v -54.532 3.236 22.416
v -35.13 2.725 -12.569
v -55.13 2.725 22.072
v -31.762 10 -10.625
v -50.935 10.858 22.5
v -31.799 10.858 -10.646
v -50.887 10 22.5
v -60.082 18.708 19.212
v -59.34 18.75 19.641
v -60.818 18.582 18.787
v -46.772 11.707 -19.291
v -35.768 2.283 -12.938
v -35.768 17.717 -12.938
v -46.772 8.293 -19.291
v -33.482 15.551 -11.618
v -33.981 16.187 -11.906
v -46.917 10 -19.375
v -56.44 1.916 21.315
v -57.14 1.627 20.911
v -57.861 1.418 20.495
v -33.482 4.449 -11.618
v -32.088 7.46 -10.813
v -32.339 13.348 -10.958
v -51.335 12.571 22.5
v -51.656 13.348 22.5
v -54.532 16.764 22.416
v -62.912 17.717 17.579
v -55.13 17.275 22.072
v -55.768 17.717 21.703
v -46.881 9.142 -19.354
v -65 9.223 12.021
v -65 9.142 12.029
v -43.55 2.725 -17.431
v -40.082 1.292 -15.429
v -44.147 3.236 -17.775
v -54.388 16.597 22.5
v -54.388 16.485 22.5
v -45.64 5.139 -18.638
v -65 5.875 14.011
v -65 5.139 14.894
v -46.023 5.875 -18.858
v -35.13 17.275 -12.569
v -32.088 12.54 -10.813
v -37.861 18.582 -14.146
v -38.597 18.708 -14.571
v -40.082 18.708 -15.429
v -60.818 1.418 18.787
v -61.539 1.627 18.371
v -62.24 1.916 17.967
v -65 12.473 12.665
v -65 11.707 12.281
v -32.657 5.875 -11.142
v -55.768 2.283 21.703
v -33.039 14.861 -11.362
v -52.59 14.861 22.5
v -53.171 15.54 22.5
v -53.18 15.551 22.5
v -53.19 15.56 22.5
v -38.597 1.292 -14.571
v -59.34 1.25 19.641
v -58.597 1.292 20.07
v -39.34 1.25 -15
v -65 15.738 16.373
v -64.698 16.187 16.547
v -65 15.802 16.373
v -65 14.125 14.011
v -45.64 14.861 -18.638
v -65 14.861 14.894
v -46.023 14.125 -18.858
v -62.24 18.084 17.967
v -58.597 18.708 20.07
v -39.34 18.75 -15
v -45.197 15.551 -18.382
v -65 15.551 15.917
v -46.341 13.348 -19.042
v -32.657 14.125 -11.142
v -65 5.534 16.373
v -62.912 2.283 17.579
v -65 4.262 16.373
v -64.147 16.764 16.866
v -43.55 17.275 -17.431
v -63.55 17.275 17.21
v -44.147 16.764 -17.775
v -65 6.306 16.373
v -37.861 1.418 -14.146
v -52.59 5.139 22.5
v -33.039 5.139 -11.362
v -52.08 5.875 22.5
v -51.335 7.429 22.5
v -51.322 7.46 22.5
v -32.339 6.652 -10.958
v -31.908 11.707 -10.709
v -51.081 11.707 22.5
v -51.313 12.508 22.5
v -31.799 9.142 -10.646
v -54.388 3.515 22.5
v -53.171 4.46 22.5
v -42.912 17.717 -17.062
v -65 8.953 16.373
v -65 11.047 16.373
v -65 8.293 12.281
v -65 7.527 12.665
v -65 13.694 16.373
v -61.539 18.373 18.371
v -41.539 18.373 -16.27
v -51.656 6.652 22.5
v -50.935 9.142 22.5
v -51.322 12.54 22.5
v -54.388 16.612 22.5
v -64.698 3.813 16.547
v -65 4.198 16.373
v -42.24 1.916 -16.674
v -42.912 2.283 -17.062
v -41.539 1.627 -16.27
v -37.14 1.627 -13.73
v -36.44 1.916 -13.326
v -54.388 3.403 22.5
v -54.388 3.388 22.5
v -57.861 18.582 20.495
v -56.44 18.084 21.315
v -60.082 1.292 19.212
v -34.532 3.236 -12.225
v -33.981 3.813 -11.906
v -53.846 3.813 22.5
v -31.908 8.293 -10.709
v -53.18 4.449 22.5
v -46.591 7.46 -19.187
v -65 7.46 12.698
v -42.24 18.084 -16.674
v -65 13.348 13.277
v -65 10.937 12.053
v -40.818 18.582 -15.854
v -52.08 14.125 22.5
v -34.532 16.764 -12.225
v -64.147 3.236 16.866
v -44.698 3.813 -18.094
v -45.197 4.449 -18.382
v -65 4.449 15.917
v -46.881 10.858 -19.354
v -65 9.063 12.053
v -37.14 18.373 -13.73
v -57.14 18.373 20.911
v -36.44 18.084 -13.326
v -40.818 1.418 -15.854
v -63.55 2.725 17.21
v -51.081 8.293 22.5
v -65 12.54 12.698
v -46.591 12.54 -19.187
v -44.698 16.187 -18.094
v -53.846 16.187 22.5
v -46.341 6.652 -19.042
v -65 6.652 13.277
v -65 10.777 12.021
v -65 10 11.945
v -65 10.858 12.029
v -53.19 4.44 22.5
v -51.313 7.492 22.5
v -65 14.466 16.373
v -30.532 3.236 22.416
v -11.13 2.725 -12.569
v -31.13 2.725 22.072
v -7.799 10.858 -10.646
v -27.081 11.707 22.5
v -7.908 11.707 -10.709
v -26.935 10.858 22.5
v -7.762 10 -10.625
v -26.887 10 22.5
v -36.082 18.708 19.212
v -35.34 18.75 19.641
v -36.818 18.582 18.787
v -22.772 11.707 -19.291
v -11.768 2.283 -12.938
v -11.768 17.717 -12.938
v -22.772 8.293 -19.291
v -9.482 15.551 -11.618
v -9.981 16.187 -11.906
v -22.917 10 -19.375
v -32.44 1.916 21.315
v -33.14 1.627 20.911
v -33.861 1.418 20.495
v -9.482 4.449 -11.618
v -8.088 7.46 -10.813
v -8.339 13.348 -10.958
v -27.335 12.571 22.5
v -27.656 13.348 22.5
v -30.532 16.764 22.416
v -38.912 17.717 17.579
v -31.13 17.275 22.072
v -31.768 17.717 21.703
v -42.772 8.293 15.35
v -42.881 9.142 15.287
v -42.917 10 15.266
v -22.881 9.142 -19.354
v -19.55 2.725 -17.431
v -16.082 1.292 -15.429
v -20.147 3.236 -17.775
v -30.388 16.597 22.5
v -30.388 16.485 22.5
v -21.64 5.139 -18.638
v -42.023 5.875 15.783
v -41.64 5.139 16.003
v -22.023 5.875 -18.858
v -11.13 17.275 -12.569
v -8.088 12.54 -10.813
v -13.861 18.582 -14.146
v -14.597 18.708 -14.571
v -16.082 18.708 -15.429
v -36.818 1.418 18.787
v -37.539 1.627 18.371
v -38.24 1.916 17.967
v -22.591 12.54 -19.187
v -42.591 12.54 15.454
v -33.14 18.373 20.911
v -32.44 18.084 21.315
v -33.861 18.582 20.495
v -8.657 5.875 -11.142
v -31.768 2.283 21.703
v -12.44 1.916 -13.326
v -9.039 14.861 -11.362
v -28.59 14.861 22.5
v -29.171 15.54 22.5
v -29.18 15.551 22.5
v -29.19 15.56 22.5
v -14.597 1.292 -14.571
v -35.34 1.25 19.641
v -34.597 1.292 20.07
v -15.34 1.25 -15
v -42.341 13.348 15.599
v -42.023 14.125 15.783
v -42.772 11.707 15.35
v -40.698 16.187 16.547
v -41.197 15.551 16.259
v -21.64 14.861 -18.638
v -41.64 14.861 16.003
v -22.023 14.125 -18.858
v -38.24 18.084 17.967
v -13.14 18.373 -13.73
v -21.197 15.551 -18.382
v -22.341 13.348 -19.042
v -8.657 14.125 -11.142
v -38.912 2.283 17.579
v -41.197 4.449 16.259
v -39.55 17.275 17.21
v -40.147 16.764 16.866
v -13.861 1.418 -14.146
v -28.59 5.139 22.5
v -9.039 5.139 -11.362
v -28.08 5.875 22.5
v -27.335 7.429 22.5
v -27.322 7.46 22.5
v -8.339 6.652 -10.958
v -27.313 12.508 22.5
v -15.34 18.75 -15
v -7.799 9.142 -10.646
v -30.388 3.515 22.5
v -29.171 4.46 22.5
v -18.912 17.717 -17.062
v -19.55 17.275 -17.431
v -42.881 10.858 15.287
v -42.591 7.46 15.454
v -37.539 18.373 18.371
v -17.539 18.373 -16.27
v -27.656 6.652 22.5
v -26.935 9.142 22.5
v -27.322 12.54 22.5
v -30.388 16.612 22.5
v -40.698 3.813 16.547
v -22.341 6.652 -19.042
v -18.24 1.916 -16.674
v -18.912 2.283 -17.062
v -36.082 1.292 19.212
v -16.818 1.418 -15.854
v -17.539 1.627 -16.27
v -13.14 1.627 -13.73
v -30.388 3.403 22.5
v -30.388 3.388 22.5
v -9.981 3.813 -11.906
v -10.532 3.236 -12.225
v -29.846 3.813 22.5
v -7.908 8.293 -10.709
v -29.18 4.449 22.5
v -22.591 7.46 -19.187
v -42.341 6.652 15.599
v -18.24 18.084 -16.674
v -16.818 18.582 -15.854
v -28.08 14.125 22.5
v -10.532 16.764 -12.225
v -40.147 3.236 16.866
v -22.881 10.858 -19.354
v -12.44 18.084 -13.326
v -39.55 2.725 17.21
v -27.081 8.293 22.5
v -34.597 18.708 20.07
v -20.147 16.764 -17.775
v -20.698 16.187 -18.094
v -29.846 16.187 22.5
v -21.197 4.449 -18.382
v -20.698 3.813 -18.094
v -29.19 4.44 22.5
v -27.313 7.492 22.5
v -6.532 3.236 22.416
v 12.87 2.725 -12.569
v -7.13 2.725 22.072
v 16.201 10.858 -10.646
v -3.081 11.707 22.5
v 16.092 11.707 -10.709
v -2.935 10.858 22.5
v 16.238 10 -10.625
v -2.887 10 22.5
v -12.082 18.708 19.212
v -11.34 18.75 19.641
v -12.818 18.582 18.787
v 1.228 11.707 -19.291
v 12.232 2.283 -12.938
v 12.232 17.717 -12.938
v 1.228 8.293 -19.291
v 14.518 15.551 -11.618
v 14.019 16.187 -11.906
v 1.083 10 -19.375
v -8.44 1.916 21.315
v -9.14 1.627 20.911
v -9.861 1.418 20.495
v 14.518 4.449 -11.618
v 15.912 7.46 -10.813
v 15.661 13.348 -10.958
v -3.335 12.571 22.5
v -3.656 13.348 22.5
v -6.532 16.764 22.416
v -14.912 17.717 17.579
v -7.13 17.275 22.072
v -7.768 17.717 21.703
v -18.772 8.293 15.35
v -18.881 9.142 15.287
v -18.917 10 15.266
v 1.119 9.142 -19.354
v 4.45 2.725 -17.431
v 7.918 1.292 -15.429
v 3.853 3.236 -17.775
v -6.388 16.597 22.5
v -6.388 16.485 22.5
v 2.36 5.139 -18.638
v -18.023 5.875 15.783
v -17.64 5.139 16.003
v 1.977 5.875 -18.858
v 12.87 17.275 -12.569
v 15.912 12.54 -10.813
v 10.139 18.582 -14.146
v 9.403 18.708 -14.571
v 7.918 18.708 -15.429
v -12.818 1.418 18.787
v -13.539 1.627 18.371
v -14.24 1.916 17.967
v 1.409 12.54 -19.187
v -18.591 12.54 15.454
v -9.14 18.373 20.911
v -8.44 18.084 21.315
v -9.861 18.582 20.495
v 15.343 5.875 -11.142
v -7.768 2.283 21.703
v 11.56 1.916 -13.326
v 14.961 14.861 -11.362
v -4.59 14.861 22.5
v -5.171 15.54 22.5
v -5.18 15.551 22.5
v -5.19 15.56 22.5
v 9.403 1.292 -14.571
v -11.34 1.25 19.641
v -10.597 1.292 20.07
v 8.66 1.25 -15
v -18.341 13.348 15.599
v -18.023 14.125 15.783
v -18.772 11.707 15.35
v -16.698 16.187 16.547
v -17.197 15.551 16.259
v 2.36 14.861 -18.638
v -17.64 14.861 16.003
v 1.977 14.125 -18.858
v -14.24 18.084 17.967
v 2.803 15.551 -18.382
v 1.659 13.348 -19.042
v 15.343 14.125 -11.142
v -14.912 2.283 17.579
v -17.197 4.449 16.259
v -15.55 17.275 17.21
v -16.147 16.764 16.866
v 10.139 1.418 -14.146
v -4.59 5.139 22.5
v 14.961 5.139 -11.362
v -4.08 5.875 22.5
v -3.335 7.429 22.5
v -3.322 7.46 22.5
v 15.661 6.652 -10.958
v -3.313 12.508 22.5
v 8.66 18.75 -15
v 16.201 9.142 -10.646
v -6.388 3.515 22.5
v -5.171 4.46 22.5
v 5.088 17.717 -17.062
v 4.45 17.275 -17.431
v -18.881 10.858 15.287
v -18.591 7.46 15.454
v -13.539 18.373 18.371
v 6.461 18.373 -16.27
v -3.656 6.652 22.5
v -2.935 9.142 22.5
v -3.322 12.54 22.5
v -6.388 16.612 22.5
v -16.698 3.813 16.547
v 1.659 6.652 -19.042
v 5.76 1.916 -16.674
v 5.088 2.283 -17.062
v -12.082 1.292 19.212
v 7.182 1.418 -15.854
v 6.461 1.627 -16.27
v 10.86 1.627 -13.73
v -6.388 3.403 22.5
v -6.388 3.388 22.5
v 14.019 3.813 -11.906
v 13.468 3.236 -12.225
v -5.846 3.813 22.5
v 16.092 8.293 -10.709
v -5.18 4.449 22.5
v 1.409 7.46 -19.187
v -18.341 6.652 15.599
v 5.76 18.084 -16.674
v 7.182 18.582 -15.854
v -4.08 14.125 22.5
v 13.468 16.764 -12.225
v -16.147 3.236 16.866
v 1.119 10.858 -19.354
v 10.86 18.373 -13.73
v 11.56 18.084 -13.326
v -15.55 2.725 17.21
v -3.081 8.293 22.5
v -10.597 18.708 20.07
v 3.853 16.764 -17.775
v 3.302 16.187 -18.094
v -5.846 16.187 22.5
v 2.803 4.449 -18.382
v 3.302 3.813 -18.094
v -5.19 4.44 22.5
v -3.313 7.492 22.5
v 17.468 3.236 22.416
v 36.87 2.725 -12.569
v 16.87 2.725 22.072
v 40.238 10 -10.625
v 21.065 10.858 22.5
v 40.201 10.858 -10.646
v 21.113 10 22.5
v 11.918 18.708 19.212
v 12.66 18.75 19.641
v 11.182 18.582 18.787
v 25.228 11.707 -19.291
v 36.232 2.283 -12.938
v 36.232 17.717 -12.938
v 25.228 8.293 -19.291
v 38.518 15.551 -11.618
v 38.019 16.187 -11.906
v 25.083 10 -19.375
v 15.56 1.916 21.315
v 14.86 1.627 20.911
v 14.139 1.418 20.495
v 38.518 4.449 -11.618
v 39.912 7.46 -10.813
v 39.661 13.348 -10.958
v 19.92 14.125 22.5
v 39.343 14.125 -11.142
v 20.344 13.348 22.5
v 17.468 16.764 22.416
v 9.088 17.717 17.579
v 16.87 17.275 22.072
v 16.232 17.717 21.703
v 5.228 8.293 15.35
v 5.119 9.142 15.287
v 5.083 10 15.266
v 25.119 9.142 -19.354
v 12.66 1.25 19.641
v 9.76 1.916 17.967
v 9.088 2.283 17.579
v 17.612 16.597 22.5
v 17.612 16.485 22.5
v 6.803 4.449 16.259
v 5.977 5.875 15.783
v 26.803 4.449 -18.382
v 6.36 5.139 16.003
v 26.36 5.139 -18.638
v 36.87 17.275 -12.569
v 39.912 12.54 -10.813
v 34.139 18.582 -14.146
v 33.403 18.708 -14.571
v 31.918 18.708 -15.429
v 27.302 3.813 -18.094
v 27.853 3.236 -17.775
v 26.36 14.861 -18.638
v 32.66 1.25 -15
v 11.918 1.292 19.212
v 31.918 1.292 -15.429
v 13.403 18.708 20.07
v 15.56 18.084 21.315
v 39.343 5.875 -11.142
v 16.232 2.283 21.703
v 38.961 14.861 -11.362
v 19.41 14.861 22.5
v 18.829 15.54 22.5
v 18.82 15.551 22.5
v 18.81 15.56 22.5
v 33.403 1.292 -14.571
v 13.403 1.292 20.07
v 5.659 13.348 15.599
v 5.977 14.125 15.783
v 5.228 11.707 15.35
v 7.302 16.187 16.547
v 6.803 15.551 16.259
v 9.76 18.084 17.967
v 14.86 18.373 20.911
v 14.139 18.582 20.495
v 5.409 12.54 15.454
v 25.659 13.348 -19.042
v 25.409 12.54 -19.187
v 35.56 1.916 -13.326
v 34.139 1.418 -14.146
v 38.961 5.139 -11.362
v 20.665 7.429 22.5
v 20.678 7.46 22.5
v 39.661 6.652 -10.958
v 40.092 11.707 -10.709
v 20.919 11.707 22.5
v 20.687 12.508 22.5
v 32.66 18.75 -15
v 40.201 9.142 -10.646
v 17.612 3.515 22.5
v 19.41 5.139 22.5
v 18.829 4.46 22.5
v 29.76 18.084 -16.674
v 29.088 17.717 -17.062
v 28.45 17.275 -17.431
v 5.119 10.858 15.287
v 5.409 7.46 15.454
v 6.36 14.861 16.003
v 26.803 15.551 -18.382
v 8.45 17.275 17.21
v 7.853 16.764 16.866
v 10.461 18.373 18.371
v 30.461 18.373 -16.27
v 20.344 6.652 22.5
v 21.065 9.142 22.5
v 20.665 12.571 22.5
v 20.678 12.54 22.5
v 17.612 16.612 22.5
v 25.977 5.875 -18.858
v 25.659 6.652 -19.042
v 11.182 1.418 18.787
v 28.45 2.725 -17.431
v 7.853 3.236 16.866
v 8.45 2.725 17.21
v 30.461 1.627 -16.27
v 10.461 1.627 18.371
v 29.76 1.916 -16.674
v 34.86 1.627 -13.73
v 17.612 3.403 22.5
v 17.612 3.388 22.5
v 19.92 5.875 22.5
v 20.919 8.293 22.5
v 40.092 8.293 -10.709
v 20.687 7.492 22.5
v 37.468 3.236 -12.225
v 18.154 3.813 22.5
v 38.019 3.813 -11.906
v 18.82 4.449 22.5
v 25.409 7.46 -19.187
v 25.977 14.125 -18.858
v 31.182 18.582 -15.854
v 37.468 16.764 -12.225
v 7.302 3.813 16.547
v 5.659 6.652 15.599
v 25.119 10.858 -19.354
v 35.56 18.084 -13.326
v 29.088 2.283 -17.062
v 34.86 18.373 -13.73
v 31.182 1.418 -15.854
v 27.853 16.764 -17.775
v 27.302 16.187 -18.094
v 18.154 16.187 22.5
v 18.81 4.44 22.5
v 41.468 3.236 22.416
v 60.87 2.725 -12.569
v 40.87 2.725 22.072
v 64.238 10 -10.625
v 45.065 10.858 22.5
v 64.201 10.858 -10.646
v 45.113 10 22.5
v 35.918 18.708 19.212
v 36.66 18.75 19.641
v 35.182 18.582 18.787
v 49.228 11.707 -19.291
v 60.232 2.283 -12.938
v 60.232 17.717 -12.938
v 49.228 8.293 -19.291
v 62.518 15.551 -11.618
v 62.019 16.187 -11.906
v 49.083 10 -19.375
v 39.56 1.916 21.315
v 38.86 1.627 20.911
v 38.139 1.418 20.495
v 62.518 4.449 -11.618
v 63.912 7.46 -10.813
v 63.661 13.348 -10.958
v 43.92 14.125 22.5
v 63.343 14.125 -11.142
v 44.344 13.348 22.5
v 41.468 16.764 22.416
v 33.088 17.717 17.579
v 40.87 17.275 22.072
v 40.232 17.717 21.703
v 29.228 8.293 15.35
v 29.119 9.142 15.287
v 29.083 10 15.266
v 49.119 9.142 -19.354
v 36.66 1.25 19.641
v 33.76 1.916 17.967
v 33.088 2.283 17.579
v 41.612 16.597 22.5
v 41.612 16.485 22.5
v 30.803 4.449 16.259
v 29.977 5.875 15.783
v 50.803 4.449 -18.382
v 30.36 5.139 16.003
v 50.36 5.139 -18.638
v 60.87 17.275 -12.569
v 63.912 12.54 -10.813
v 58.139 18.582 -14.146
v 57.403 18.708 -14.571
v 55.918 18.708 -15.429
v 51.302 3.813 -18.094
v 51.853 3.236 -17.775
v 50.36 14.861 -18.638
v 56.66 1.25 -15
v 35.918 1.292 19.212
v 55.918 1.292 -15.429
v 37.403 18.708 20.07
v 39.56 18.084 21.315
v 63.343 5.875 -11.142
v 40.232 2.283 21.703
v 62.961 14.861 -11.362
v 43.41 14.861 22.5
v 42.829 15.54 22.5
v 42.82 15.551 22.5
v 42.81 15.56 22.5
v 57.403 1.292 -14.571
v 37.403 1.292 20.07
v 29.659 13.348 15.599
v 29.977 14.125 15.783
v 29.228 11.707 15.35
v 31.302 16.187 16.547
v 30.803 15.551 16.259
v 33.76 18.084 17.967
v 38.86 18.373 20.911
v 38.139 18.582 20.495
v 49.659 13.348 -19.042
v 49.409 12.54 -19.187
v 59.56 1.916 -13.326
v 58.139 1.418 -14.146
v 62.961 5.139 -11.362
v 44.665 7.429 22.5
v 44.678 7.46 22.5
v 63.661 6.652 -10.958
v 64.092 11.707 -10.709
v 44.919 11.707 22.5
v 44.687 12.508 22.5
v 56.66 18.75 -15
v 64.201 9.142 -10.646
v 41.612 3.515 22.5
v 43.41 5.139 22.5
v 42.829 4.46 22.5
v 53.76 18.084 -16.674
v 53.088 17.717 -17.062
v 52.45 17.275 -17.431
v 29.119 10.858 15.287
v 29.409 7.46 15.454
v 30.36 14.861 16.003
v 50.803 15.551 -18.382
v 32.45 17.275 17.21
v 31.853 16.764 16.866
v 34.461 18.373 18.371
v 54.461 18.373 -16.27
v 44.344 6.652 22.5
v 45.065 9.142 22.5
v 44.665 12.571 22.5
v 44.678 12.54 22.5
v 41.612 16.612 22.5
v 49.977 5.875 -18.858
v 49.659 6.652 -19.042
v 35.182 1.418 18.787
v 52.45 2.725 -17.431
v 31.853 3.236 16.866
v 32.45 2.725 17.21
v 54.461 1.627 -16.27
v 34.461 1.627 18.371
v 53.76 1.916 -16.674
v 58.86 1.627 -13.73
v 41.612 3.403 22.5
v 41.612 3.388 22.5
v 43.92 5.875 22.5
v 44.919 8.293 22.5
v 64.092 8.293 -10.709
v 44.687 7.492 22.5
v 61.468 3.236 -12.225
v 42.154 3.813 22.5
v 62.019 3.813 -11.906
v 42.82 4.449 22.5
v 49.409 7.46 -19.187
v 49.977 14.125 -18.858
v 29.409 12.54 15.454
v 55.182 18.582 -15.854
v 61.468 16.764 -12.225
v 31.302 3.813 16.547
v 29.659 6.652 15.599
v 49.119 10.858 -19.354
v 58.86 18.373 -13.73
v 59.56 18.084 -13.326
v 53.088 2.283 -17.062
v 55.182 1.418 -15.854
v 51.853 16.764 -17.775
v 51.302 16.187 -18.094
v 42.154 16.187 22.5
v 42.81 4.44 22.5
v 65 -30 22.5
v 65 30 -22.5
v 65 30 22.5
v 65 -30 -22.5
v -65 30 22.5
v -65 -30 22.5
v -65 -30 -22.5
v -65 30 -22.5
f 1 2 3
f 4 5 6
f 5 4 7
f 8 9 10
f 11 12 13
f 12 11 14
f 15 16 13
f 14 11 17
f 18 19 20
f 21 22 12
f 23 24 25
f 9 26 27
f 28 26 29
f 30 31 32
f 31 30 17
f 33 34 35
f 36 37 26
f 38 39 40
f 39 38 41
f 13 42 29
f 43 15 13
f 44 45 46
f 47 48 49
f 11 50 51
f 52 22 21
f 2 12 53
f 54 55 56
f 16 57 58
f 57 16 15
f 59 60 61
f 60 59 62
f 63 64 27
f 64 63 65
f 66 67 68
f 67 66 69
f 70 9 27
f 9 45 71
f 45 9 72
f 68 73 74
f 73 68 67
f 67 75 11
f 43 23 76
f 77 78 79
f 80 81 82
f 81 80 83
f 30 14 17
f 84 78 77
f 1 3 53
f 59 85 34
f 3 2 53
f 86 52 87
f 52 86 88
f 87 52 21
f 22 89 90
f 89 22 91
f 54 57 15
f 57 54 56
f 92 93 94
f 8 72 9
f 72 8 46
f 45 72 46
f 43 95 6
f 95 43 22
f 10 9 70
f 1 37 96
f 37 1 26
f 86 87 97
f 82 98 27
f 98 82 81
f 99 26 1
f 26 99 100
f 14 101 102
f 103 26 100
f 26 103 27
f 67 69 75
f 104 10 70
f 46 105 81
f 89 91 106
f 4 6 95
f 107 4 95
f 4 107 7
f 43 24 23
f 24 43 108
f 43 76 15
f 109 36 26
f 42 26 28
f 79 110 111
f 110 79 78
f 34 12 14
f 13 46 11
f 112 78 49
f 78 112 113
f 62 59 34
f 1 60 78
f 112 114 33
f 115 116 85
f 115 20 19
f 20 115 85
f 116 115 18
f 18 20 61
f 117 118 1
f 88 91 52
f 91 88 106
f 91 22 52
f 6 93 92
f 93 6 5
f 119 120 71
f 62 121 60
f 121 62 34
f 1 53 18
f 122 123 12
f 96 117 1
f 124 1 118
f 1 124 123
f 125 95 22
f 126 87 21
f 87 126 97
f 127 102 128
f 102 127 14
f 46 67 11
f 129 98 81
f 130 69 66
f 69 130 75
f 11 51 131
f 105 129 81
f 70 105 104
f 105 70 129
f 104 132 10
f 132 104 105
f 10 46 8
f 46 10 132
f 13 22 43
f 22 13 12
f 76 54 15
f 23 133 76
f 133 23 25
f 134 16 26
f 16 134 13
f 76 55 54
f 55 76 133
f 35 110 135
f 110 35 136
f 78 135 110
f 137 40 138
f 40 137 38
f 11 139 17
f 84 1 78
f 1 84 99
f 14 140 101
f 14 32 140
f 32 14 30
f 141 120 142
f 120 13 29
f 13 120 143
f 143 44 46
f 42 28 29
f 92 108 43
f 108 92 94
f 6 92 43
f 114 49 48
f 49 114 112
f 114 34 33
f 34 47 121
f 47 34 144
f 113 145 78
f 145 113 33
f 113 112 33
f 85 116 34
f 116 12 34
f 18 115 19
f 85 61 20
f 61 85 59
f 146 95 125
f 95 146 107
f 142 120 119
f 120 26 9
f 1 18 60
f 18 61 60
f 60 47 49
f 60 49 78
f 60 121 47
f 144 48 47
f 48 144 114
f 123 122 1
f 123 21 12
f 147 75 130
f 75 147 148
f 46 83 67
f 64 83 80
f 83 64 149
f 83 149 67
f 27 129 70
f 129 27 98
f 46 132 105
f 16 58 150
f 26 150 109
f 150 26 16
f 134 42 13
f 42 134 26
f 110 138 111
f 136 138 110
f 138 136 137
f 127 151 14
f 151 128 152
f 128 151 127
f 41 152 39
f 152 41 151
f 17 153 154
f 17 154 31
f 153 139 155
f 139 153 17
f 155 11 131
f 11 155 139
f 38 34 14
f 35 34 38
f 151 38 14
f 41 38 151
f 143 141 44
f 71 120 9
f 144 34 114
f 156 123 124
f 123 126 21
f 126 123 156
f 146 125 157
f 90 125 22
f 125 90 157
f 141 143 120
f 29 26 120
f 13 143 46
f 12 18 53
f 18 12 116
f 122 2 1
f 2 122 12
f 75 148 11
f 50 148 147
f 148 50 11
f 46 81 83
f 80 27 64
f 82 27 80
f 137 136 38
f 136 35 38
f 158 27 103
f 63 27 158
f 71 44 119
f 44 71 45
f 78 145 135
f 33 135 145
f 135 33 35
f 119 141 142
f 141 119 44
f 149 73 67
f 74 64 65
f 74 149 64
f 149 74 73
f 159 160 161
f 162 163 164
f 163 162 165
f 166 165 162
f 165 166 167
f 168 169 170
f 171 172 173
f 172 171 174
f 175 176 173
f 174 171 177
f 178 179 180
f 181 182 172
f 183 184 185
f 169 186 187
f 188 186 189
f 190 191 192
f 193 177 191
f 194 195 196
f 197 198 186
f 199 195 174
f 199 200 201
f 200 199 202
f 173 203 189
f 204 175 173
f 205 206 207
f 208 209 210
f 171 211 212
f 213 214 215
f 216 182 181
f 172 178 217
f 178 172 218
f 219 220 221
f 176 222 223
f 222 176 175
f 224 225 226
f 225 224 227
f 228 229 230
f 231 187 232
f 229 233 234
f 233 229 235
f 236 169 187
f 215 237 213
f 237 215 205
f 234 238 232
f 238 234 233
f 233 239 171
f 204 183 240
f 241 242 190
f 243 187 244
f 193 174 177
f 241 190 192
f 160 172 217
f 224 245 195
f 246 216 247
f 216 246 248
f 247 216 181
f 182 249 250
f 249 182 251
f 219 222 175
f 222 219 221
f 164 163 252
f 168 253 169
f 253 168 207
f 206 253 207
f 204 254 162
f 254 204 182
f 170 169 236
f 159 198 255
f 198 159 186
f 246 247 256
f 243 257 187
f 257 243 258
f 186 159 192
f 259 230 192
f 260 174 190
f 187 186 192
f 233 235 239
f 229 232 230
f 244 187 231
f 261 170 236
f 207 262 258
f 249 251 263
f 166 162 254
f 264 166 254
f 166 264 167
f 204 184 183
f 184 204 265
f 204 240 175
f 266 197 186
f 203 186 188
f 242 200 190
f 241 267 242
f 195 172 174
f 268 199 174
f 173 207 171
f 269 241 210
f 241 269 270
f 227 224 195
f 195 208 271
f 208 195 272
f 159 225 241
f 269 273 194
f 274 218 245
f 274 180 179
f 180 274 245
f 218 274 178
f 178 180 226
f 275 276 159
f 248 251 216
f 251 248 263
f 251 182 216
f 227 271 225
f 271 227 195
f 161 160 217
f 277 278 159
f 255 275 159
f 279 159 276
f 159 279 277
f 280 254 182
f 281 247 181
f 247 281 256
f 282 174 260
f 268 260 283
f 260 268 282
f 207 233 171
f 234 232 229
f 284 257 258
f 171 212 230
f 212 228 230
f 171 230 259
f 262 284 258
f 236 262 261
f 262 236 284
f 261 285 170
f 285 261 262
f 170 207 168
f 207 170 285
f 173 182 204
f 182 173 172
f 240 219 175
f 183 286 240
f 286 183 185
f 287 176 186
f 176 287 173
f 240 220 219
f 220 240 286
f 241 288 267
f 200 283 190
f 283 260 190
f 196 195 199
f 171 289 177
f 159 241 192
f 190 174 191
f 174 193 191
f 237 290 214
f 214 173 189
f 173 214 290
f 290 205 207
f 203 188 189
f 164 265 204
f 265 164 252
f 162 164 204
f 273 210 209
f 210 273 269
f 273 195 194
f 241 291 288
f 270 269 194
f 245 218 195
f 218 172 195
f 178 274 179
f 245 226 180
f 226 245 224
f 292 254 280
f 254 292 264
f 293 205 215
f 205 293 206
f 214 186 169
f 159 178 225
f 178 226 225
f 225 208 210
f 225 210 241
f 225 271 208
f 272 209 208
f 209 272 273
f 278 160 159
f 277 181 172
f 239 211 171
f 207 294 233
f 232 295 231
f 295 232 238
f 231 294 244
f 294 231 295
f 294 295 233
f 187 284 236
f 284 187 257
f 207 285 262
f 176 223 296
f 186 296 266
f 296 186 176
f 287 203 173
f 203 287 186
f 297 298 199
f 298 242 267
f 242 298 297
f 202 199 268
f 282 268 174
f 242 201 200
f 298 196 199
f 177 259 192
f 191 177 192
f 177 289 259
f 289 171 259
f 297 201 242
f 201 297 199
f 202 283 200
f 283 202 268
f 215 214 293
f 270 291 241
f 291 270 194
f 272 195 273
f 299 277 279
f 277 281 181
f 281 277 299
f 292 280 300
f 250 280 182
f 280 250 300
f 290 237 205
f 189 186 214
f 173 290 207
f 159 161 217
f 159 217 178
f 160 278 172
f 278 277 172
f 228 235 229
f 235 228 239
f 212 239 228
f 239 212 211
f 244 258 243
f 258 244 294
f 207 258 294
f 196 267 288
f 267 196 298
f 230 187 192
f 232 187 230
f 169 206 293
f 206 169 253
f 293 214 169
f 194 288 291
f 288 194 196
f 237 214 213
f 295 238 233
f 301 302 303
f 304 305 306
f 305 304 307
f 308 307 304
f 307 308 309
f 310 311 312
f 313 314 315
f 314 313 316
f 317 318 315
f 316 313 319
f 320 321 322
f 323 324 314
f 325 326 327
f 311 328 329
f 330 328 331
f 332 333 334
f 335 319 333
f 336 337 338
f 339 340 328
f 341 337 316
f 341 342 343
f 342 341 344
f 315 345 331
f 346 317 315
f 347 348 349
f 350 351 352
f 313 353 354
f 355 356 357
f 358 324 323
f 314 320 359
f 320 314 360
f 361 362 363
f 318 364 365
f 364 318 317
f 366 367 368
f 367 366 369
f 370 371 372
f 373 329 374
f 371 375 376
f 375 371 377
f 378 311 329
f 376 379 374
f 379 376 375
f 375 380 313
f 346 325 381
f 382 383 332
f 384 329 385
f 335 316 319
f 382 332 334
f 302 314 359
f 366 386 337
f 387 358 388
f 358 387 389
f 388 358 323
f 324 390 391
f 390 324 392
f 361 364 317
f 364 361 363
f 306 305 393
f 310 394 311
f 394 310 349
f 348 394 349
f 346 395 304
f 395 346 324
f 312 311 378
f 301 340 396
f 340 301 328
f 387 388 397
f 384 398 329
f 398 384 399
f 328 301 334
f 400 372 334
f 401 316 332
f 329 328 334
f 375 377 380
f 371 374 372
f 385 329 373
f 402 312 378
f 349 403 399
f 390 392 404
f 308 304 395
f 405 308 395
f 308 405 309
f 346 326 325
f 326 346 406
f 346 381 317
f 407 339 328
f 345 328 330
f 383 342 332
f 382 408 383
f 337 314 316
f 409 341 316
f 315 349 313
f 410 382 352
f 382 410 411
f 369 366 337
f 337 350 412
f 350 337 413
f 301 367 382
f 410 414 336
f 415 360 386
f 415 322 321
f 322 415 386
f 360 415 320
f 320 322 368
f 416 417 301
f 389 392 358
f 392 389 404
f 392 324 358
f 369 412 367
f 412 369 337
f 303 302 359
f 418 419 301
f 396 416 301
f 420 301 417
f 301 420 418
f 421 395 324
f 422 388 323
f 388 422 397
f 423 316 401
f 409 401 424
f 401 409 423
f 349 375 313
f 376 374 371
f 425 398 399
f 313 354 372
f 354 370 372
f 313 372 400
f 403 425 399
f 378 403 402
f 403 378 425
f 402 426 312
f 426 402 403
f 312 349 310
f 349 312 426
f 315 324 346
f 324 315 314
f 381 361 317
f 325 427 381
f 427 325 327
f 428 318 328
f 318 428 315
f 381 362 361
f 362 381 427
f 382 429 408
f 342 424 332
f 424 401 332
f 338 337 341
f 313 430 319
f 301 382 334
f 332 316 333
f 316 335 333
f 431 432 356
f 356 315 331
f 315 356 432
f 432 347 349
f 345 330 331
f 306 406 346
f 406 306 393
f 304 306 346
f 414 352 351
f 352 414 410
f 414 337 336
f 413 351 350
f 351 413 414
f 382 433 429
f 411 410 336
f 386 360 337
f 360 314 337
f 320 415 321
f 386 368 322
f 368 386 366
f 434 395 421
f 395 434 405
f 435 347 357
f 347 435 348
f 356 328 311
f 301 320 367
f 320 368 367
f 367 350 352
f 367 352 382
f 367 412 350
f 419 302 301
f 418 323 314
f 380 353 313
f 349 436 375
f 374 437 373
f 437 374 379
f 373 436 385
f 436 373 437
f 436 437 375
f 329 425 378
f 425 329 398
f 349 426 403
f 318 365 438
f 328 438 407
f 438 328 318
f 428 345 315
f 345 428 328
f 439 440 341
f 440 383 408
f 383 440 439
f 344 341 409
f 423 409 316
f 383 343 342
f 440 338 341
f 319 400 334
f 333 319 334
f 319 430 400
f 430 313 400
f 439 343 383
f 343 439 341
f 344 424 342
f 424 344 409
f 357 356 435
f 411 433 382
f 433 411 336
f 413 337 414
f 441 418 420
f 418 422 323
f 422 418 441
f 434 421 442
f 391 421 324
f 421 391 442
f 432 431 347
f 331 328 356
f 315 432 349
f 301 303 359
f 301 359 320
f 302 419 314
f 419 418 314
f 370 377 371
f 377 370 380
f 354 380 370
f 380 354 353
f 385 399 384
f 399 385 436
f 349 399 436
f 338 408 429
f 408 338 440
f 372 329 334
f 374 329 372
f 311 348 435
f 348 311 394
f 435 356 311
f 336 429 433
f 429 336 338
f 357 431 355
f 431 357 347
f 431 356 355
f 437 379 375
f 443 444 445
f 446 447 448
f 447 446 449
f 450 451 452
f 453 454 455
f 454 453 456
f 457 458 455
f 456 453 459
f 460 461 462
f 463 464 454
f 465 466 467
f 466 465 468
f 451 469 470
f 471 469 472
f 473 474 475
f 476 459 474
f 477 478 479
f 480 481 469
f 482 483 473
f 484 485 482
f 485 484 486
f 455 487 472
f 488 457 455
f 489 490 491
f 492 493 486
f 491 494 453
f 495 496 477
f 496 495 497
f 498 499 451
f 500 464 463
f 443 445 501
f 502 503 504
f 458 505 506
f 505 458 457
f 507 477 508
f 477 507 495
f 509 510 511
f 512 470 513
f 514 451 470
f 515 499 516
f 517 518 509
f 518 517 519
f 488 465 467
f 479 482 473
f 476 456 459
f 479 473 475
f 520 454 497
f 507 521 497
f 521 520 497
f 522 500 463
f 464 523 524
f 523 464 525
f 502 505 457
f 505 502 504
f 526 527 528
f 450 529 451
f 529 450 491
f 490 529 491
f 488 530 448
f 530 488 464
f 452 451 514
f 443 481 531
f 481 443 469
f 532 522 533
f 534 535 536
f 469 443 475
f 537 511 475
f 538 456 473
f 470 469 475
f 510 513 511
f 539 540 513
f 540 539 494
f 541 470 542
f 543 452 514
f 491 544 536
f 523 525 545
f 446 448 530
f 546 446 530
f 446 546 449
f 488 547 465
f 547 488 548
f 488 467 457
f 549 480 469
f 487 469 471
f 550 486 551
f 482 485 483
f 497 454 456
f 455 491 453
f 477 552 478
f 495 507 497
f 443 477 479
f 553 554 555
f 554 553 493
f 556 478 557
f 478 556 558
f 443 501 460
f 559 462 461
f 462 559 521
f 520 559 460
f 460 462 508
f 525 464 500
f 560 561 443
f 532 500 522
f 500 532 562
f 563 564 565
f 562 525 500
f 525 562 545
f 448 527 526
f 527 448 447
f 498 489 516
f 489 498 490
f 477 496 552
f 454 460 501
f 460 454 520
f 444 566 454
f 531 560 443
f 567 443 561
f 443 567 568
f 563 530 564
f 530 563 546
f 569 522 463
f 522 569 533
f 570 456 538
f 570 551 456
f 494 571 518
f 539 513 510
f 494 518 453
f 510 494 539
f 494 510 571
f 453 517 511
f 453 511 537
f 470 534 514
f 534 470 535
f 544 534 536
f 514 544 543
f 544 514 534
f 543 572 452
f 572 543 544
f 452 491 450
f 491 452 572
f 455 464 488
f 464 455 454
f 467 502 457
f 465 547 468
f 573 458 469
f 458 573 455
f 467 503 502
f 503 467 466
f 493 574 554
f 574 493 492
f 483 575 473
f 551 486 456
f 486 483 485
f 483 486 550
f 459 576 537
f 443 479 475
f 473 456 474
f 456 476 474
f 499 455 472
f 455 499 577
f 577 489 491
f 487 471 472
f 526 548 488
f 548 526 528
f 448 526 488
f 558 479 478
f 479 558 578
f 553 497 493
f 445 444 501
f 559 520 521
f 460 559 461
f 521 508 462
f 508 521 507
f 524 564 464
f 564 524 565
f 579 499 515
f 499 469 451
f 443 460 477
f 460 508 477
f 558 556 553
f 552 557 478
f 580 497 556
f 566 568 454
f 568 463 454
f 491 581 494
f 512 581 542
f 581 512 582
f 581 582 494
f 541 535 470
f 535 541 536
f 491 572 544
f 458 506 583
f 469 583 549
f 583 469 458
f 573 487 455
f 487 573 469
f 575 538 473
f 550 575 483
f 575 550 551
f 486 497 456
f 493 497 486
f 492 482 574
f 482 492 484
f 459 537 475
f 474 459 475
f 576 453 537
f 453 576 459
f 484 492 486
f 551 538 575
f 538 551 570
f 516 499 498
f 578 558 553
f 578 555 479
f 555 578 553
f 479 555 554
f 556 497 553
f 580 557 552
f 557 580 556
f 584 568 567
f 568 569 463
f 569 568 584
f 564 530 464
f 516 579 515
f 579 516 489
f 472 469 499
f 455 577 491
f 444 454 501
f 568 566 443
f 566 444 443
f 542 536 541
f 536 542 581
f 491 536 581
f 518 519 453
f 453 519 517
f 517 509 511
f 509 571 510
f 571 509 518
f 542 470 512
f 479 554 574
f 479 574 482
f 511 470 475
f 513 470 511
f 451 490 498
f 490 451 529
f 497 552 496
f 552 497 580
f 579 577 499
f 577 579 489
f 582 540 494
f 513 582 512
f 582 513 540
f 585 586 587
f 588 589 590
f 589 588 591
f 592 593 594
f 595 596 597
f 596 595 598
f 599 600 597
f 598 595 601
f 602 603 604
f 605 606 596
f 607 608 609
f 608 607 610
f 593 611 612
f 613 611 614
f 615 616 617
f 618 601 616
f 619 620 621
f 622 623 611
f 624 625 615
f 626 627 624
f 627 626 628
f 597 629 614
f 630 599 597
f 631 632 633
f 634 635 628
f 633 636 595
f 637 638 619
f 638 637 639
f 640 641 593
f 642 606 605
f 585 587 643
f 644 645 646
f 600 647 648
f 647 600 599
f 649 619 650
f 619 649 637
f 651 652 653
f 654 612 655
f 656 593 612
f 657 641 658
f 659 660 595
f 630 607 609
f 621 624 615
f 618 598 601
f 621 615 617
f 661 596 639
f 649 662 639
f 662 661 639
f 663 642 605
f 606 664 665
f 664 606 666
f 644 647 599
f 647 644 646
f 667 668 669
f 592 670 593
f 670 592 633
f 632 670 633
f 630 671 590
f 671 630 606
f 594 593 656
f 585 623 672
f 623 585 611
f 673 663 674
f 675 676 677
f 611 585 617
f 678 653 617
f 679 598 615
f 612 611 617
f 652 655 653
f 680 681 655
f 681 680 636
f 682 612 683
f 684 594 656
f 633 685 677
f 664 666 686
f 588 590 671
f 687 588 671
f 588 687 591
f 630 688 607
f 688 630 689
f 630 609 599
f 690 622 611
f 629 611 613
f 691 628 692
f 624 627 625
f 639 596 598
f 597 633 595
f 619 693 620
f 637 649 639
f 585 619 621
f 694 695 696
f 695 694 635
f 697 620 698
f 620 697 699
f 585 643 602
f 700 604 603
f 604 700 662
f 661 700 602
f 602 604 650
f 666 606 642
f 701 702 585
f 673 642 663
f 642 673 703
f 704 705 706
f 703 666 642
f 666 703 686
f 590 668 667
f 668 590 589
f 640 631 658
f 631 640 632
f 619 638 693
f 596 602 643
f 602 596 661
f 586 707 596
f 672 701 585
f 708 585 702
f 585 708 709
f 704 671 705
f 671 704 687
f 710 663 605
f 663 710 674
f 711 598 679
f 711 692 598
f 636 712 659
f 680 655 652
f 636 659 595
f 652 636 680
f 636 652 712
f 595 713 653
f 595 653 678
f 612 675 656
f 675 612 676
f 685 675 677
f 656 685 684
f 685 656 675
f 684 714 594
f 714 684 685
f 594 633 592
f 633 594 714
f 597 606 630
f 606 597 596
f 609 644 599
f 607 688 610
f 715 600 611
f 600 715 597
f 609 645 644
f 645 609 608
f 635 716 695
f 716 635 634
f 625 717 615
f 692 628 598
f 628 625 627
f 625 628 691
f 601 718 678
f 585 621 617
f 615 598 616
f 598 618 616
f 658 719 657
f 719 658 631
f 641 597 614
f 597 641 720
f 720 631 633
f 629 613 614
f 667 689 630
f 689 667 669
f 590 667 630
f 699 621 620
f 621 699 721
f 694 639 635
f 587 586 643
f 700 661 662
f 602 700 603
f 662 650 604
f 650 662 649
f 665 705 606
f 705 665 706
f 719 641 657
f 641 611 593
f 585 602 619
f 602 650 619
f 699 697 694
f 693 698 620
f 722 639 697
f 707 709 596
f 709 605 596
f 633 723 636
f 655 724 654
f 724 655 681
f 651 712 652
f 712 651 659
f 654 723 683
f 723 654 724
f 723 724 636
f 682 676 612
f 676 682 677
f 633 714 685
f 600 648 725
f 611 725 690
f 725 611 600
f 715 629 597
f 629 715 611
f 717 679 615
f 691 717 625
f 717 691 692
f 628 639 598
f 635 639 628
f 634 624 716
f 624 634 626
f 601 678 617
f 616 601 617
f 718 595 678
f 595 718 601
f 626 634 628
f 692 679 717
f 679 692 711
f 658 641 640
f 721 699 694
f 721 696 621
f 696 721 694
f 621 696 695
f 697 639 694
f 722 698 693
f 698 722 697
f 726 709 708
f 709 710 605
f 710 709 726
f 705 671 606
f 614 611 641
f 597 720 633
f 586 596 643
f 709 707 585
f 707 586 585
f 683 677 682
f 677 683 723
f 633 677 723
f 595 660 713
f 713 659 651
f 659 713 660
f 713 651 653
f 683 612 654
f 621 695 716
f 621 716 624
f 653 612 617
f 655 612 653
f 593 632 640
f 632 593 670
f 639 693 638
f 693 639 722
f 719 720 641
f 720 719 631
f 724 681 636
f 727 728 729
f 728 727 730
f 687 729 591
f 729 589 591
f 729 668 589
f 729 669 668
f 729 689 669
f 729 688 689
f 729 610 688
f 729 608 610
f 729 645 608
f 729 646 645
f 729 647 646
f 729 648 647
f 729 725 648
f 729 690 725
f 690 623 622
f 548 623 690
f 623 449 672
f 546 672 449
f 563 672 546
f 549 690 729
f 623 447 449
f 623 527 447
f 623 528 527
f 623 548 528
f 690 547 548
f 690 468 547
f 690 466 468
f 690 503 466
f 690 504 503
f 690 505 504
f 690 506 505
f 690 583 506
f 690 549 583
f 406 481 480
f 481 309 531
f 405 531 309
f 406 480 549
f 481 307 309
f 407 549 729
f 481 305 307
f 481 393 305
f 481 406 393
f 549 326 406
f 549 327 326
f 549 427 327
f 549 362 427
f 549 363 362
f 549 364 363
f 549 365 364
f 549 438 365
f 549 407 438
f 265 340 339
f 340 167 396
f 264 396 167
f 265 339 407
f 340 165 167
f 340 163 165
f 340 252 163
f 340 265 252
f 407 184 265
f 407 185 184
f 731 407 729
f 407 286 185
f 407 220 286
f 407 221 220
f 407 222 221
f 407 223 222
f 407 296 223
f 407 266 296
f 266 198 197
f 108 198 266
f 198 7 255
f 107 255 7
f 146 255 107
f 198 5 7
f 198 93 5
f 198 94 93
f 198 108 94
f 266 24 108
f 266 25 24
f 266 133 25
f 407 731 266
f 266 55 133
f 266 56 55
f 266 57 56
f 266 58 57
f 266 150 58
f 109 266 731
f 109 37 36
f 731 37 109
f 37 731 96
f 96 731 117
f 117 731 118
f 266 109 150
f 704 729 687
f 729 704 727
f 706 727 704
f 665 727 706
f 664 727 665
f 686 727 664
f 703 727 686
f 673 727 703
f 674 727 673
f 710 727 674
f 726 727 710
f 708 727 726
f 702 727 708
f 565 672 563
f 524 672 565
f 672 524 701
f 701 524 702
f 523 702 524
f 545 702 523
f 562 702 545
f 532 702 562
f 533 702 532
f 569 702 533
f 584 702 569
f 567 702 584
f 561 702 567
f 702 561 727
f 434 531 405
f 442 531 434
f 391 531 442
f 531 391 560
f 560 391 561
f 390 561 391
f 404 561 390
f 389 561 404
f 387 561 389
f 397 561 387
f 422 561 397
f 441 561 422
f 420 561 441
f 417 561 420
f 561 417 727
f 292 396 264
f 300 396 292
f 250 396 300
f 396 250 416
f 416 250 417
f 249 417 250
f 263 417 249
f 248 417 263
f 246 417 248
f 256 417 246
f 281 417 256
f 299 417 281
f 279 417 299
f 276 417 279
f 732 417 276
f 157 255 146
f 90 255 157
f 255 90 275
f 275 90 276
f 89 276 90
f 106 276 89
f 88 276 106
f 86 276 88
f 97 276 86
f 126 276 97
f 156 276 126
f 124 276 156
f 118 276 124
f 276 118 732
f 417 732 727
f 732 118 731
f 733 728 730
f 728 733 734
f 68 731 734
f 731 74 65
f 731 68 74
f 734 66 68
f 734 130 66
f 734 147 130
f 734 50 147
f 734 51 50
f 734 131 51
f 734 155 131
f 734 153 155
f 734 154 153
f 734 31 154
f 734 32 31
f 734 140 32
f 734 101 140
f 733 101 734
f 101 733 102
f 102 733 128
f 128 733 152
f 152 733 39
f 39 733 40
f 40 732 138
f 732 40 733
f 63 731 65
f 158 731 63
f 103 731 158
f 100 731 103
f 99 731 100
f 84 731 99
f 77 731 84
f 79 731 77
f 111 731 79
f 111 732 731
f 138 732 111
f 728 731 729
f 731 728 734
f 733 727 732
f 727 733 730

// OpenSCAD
// --- Dimensions ---
rack_length = 130;    // Total length along X (mm)
rack_depth = 60;      // Total depth along Y (mm)
rack_height = 45;     // Total height along Z (mm)

tube_hole_diameter = 17.5; // Diameter of the tube hole (mm)
tube_hole_radius = tube_hole_diameter / 2;
tube_hole_depth = 40;    // Depth of the cylindrical cut (mm)

num_tubes = 5;         // Number of tubes to hold
spacing_x = 24;        // Distance between centers of holes along X (mm)

tilt_angle = 30;       // Tilt angle in degrees from vertical (YZ plane)

// --- Constants ---
$fn = 64; // High resolution for curves

// --- Base Block Definition ---
module base_block() {
    cube([rack_length, rack_depth, rack_height], center = true);
}

// --- Hole Geometry Calculation ---
// The holes are centered along X. We need to find the starting X positions.
// Total span for 5 tubes: (5-1) * spacing_x = 4 * 24 = 96 mm.
// Centered on origin, so start offset is -96/2 = -48 mm from center.
module hole_positions() {
    for (i = [0 : num_tubes - 1]) {
        x_pos = (-((num_tubes - 1) * spacing_x) / 2) + (i * spacing_x);
        // The holes are centered on the block, so X is relative to origin.
        translate([x_pos, 0, 0]) {
            // We will define the cylinder cut later using transformations
        }
    }
}

// --- Hole Cutting Module ---
module tube_hole(center_x) {
    // The hole axis starts at Z = rack_height/2 (top face center) and goes down.
    // It is tilted 30 degrees in the YZ plane, moving towards +Y.
    // Rotation around X-axis by -tilt_angle tilts it towards +Y.

    // We use a cylinder centered at its local origin, then translate/rotate it so that its top face aligns with Z=rack_height/2.

    // The distance along the tilted axis from the entry point to the center is tube_hole_depth / 2.
    // When rotated by -tilt_angle around X:
    // Local Z maps to world vector [0, sin(tilt_angle), cos(tilt_angle)] (if we consider the rotation of the object).

    // We need the cylinder's center in world coordinates such that its top face is at Z = rack_height/2.
    // The entry point on the block surface is P_entry = [center_x, 0, rack_height/2].
    // The vector from P_entry to the center of the cylinder along the tilted axis must be:
    // Offset_vector = [0, (tube_hole_depth/2) * sin(tilt_angle), -(tube_hole_depth/2) * cos(tilt_angle)]

    translate([center_x, 0, 0]) {
        rotate([0, -tilt_angle, 0]) {
            // Translate the cylinder so its center is correctly positioned relative to the entry point on Z=rack_height/2.
            // The translation vector must counteract the rotation effect on the local Z-axis projection onto world Y and Z.
            translate([0, (tube_hole_depth/2) * sin(tilt_angle), -(tube_hole_depth/2) * cos(tilt_angle)]) {
                cylinder(h = tube_hole_depth, r = tube_hole_radius);
            }
        }
    }
}

// --- Final Assembly ---
difference() {
    // 1. The solid block
    base_block();

    // 2. Subtract the five holes
    union() {
        for (i = [0 : num_tubes - 1]) {
            x_pos = (-((num_tubes - 1) * spacing_x) / 2) + (i * spacing_x);
            tube_hole(center_x = x_pos);
        }
    }
}
